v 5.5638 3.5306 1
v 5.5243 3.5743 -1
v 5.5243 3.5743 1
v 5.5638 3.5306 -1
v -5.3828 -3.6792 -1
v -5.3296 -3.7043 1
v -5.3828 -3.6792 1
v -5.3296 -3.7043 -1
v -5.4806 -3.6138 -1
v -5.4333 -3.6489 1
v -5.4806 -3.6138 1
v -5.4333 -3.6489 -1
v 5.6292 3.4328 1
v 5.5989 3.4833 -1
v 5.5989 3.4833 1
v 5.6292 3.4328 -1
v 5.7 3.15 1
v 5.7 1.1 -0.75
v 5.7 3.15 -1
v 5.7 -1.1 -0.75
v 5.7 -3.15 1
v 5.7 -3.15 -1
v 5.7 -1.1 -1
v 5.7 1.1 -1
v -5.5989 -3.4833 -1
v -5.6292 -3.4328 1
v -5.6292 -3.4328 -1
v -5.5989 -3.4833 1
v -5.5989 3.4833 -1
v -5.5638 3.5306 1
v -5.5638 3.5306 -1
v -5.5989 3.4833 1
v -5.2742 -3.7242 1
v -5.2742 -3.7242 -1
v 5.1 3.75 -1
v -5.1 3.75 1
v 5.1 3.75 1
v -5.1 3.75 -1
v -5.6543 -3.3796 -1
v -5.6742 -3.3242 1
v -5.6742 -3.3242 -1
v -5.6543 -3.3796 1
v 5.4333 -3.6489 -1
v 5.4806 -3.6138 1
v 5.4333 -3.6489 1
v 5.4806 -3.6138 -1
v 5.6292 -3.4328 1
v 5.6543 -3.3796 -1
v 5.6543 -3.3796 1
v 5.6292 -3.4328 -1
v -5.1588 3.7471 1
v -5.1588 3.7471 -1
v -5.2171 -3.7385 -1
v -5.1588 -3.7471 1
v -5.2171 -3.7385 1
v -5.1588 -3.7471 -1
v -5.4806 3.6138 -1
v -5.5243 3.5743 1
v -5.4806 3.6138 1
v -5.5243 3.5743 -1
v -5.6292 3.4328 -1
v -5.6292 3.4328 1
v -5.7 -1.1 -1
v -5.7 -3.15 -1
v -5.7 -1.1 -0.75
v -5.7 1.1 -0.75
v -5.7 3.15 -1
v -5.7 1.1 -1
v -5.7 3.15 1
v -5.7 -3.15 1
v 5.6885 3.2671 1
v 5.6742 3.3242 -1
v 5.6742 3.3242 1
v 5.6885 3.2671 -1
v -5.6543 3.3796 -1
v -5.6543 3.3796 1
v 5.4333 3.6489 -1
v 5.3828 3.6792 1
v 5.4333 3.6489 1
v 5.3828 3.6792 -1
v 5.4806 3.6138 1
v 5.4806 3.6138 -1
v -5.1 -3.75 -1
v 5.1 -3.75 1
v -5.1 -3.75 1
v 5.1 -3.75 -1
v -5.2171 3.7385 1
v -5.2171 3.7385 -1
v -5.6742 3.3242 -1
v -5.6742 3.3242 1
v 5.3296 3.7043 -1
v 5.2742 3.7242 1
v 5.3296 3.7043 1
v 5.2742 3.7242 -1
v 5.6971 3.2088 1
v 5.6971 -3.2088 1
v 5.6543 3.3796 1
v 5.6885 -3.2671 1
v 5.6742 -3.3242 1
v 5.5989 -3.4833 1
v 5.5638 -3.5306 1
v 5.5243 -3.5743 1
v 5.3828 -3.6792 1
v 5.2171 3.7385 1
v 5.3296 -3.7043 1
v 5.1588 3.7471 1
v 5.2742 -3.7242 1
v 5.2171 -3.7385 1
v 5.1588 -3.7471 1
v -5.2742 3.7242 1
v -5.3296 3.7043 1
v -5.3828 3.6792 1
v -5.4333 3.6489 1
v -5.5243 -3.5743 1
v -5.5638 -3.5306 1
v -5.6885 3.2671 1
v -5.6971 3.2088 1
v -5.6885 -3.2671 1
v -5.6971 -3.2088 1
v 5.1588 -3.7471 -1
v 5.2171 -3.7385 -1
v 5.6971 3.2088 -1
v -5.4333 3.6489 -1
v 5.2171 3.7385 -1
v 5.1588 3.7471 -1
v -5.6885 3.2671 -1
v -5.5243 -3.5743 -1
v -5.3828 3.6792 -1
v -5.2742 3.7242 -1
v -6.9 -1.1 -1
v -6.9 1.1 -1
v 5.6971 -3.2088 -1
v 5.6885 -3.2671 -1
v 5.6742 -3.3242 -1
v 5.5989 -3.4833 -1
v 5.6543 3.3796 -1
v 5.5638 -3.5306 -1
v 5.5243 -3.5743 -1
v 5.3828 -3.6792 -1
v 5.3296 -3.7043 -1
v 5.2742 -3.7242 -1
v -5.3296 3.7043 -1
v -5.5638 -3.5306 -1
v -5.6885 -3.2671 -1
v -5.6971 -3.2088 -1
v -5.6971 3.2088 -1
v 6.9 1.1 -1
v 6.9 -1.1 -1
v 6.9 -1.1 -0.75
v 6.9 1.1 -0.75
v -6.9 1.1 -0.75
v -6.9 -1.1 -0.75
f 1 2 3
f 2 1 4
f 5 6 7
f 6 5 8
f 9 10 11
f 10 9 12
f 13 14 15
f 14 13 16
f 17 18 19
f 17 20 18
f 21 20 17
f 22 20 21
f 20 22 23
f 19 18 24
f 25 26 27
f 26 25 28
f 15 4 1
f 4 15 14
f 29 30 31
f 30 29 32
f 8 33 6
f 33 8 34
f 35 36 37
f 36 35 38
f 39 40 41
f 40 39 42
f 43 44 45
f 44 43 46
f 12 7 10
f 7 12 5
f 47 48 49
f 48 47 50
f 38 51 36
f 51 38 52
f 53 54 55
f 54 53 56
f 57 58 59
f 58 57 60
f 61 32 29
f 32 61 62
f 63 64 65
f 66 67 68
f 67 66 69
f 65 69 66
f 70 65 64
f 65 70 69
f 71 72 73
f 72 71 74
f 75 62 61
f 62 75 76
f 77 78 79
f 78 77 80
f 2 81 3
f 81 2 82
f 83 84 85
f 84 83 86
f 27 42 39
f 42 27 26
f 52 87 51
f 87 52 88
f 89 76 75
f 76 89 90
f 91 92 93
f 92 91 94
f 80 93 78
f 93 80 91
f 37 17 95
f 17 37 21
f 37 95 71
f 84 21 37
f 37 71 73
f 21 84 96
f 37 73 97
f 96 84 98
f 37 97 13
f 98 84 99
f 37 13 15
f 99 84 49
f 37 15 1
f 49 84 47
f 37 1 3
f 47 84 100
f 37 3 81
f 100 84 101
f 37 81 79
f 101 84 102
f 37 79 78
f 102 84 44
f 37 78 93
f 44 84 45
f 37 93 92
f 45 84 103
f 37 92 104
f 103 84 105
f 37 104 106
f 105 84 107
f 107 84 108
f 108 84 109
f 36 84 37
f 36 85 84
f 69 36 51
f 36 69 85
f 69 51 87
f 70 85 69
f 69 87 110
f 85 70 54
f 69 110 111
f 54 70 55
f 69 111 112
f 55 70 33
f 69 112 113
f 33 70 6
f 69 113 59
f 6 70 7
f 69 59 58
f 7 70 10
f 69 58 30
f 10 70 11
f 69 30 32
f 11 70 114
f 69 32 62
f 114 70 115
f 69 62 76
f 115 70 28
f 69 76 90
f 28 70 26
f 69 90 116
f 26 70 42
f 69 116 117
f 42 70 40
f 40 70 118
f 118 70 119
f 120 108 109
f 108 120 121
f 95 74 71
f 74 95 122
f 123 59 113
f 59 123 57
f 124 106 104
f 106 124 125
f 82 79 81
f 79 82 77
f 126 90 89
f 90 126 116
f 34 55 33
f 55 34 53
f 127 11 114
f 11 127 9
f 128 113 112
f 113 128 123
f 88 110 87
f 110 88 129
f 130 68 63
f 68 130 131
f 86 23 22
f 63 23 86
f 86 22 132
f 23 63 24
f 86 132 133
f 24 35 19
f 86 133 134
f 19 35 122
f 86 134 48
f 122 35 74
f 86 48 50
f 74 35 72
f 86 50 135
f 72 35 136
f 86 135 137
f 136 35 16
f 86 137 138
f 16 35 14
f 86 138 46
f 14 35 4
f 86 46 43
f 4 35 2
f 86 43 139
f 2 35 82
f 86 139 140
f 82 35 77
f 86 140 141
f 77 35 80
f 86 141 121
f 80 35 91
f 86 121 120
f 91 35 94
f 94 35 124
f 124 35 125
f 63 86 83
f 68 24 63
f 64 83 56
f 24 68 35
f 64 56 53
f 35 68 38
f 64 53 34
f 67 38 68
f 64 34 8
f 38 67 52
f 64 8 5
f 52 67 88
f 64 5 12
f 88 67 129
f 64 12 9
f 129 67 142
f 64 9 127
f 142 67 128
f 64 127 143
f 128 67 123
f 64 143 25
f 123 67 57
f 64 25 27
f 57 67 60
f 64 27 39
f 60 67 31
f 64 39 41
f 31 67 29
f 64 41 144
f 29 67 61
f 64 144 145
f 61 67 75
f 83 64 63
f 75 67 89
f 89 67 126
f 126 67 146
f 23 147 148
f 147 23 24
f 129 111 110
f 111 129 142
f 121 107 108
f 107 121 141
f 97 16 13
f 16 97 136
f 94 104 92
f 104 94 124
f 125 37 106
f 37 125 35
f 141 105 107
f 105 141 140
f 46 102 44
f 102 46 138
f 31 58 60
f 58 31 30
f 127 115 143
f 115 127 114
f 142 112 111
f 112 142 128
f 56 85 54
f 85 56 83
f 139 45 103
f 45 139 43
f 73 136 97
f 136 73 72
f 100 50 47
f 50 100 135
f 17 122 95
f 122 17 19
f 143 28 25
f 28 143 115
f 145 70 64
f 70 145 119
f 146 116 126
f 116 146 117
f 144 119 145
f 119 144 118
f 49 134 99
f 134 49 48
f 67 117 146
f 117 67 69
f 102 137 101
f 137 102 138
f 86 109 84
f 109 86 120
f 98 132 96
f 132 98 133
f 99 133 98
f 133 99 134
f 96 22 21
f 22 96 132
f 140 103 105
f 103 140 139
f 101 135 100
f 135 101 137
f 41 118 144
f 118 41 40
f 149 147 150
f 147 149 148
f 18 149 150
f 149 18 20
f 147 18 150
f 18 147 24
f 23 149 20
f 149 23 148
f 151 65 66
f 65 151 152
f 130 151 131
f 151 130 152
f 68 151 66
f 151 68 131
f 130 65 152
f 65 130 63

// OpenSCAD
$fn=64;

module smd_body(size=[11.40,7.50,2.00], corner_r=0.6){
    x=size[0]; y=size[1]; z=size[2];
    r=min(corner_r, min(x,y)/2);
    hull(){
        for (sx=[-1,1], sy=[-1,1]){
            translate([sx*(x/2 - r), sy*(y/2 - r), 0])
                cylinder(h=z, r=r, center=true);
        }
    }
}

module smd_lead(len=1.2, width=2.2, thick=0.25, body=[11.40,7.50,2.00]){
    translate([0,0,-(body[2]/2 - thick/2)])
        cube([len, width, thick], center=true);
}

module smd_package(size=[11.40,7.50,2.00]){
    union(){
        smd_body(size=size, corner_r=0.6);
        translate([ size[0]/2 + 0.6, 0, 0]) smd_lead(len=1.2, width=2.2, thick=0.25, body=size);
        translate([-size[0]/2 - 0.6, 0, 0]) smd_lead(len=1.2, width=2.2, thick=0.25, body=size);
    }
}

smd_package([11.40,7.50,2.00]);
